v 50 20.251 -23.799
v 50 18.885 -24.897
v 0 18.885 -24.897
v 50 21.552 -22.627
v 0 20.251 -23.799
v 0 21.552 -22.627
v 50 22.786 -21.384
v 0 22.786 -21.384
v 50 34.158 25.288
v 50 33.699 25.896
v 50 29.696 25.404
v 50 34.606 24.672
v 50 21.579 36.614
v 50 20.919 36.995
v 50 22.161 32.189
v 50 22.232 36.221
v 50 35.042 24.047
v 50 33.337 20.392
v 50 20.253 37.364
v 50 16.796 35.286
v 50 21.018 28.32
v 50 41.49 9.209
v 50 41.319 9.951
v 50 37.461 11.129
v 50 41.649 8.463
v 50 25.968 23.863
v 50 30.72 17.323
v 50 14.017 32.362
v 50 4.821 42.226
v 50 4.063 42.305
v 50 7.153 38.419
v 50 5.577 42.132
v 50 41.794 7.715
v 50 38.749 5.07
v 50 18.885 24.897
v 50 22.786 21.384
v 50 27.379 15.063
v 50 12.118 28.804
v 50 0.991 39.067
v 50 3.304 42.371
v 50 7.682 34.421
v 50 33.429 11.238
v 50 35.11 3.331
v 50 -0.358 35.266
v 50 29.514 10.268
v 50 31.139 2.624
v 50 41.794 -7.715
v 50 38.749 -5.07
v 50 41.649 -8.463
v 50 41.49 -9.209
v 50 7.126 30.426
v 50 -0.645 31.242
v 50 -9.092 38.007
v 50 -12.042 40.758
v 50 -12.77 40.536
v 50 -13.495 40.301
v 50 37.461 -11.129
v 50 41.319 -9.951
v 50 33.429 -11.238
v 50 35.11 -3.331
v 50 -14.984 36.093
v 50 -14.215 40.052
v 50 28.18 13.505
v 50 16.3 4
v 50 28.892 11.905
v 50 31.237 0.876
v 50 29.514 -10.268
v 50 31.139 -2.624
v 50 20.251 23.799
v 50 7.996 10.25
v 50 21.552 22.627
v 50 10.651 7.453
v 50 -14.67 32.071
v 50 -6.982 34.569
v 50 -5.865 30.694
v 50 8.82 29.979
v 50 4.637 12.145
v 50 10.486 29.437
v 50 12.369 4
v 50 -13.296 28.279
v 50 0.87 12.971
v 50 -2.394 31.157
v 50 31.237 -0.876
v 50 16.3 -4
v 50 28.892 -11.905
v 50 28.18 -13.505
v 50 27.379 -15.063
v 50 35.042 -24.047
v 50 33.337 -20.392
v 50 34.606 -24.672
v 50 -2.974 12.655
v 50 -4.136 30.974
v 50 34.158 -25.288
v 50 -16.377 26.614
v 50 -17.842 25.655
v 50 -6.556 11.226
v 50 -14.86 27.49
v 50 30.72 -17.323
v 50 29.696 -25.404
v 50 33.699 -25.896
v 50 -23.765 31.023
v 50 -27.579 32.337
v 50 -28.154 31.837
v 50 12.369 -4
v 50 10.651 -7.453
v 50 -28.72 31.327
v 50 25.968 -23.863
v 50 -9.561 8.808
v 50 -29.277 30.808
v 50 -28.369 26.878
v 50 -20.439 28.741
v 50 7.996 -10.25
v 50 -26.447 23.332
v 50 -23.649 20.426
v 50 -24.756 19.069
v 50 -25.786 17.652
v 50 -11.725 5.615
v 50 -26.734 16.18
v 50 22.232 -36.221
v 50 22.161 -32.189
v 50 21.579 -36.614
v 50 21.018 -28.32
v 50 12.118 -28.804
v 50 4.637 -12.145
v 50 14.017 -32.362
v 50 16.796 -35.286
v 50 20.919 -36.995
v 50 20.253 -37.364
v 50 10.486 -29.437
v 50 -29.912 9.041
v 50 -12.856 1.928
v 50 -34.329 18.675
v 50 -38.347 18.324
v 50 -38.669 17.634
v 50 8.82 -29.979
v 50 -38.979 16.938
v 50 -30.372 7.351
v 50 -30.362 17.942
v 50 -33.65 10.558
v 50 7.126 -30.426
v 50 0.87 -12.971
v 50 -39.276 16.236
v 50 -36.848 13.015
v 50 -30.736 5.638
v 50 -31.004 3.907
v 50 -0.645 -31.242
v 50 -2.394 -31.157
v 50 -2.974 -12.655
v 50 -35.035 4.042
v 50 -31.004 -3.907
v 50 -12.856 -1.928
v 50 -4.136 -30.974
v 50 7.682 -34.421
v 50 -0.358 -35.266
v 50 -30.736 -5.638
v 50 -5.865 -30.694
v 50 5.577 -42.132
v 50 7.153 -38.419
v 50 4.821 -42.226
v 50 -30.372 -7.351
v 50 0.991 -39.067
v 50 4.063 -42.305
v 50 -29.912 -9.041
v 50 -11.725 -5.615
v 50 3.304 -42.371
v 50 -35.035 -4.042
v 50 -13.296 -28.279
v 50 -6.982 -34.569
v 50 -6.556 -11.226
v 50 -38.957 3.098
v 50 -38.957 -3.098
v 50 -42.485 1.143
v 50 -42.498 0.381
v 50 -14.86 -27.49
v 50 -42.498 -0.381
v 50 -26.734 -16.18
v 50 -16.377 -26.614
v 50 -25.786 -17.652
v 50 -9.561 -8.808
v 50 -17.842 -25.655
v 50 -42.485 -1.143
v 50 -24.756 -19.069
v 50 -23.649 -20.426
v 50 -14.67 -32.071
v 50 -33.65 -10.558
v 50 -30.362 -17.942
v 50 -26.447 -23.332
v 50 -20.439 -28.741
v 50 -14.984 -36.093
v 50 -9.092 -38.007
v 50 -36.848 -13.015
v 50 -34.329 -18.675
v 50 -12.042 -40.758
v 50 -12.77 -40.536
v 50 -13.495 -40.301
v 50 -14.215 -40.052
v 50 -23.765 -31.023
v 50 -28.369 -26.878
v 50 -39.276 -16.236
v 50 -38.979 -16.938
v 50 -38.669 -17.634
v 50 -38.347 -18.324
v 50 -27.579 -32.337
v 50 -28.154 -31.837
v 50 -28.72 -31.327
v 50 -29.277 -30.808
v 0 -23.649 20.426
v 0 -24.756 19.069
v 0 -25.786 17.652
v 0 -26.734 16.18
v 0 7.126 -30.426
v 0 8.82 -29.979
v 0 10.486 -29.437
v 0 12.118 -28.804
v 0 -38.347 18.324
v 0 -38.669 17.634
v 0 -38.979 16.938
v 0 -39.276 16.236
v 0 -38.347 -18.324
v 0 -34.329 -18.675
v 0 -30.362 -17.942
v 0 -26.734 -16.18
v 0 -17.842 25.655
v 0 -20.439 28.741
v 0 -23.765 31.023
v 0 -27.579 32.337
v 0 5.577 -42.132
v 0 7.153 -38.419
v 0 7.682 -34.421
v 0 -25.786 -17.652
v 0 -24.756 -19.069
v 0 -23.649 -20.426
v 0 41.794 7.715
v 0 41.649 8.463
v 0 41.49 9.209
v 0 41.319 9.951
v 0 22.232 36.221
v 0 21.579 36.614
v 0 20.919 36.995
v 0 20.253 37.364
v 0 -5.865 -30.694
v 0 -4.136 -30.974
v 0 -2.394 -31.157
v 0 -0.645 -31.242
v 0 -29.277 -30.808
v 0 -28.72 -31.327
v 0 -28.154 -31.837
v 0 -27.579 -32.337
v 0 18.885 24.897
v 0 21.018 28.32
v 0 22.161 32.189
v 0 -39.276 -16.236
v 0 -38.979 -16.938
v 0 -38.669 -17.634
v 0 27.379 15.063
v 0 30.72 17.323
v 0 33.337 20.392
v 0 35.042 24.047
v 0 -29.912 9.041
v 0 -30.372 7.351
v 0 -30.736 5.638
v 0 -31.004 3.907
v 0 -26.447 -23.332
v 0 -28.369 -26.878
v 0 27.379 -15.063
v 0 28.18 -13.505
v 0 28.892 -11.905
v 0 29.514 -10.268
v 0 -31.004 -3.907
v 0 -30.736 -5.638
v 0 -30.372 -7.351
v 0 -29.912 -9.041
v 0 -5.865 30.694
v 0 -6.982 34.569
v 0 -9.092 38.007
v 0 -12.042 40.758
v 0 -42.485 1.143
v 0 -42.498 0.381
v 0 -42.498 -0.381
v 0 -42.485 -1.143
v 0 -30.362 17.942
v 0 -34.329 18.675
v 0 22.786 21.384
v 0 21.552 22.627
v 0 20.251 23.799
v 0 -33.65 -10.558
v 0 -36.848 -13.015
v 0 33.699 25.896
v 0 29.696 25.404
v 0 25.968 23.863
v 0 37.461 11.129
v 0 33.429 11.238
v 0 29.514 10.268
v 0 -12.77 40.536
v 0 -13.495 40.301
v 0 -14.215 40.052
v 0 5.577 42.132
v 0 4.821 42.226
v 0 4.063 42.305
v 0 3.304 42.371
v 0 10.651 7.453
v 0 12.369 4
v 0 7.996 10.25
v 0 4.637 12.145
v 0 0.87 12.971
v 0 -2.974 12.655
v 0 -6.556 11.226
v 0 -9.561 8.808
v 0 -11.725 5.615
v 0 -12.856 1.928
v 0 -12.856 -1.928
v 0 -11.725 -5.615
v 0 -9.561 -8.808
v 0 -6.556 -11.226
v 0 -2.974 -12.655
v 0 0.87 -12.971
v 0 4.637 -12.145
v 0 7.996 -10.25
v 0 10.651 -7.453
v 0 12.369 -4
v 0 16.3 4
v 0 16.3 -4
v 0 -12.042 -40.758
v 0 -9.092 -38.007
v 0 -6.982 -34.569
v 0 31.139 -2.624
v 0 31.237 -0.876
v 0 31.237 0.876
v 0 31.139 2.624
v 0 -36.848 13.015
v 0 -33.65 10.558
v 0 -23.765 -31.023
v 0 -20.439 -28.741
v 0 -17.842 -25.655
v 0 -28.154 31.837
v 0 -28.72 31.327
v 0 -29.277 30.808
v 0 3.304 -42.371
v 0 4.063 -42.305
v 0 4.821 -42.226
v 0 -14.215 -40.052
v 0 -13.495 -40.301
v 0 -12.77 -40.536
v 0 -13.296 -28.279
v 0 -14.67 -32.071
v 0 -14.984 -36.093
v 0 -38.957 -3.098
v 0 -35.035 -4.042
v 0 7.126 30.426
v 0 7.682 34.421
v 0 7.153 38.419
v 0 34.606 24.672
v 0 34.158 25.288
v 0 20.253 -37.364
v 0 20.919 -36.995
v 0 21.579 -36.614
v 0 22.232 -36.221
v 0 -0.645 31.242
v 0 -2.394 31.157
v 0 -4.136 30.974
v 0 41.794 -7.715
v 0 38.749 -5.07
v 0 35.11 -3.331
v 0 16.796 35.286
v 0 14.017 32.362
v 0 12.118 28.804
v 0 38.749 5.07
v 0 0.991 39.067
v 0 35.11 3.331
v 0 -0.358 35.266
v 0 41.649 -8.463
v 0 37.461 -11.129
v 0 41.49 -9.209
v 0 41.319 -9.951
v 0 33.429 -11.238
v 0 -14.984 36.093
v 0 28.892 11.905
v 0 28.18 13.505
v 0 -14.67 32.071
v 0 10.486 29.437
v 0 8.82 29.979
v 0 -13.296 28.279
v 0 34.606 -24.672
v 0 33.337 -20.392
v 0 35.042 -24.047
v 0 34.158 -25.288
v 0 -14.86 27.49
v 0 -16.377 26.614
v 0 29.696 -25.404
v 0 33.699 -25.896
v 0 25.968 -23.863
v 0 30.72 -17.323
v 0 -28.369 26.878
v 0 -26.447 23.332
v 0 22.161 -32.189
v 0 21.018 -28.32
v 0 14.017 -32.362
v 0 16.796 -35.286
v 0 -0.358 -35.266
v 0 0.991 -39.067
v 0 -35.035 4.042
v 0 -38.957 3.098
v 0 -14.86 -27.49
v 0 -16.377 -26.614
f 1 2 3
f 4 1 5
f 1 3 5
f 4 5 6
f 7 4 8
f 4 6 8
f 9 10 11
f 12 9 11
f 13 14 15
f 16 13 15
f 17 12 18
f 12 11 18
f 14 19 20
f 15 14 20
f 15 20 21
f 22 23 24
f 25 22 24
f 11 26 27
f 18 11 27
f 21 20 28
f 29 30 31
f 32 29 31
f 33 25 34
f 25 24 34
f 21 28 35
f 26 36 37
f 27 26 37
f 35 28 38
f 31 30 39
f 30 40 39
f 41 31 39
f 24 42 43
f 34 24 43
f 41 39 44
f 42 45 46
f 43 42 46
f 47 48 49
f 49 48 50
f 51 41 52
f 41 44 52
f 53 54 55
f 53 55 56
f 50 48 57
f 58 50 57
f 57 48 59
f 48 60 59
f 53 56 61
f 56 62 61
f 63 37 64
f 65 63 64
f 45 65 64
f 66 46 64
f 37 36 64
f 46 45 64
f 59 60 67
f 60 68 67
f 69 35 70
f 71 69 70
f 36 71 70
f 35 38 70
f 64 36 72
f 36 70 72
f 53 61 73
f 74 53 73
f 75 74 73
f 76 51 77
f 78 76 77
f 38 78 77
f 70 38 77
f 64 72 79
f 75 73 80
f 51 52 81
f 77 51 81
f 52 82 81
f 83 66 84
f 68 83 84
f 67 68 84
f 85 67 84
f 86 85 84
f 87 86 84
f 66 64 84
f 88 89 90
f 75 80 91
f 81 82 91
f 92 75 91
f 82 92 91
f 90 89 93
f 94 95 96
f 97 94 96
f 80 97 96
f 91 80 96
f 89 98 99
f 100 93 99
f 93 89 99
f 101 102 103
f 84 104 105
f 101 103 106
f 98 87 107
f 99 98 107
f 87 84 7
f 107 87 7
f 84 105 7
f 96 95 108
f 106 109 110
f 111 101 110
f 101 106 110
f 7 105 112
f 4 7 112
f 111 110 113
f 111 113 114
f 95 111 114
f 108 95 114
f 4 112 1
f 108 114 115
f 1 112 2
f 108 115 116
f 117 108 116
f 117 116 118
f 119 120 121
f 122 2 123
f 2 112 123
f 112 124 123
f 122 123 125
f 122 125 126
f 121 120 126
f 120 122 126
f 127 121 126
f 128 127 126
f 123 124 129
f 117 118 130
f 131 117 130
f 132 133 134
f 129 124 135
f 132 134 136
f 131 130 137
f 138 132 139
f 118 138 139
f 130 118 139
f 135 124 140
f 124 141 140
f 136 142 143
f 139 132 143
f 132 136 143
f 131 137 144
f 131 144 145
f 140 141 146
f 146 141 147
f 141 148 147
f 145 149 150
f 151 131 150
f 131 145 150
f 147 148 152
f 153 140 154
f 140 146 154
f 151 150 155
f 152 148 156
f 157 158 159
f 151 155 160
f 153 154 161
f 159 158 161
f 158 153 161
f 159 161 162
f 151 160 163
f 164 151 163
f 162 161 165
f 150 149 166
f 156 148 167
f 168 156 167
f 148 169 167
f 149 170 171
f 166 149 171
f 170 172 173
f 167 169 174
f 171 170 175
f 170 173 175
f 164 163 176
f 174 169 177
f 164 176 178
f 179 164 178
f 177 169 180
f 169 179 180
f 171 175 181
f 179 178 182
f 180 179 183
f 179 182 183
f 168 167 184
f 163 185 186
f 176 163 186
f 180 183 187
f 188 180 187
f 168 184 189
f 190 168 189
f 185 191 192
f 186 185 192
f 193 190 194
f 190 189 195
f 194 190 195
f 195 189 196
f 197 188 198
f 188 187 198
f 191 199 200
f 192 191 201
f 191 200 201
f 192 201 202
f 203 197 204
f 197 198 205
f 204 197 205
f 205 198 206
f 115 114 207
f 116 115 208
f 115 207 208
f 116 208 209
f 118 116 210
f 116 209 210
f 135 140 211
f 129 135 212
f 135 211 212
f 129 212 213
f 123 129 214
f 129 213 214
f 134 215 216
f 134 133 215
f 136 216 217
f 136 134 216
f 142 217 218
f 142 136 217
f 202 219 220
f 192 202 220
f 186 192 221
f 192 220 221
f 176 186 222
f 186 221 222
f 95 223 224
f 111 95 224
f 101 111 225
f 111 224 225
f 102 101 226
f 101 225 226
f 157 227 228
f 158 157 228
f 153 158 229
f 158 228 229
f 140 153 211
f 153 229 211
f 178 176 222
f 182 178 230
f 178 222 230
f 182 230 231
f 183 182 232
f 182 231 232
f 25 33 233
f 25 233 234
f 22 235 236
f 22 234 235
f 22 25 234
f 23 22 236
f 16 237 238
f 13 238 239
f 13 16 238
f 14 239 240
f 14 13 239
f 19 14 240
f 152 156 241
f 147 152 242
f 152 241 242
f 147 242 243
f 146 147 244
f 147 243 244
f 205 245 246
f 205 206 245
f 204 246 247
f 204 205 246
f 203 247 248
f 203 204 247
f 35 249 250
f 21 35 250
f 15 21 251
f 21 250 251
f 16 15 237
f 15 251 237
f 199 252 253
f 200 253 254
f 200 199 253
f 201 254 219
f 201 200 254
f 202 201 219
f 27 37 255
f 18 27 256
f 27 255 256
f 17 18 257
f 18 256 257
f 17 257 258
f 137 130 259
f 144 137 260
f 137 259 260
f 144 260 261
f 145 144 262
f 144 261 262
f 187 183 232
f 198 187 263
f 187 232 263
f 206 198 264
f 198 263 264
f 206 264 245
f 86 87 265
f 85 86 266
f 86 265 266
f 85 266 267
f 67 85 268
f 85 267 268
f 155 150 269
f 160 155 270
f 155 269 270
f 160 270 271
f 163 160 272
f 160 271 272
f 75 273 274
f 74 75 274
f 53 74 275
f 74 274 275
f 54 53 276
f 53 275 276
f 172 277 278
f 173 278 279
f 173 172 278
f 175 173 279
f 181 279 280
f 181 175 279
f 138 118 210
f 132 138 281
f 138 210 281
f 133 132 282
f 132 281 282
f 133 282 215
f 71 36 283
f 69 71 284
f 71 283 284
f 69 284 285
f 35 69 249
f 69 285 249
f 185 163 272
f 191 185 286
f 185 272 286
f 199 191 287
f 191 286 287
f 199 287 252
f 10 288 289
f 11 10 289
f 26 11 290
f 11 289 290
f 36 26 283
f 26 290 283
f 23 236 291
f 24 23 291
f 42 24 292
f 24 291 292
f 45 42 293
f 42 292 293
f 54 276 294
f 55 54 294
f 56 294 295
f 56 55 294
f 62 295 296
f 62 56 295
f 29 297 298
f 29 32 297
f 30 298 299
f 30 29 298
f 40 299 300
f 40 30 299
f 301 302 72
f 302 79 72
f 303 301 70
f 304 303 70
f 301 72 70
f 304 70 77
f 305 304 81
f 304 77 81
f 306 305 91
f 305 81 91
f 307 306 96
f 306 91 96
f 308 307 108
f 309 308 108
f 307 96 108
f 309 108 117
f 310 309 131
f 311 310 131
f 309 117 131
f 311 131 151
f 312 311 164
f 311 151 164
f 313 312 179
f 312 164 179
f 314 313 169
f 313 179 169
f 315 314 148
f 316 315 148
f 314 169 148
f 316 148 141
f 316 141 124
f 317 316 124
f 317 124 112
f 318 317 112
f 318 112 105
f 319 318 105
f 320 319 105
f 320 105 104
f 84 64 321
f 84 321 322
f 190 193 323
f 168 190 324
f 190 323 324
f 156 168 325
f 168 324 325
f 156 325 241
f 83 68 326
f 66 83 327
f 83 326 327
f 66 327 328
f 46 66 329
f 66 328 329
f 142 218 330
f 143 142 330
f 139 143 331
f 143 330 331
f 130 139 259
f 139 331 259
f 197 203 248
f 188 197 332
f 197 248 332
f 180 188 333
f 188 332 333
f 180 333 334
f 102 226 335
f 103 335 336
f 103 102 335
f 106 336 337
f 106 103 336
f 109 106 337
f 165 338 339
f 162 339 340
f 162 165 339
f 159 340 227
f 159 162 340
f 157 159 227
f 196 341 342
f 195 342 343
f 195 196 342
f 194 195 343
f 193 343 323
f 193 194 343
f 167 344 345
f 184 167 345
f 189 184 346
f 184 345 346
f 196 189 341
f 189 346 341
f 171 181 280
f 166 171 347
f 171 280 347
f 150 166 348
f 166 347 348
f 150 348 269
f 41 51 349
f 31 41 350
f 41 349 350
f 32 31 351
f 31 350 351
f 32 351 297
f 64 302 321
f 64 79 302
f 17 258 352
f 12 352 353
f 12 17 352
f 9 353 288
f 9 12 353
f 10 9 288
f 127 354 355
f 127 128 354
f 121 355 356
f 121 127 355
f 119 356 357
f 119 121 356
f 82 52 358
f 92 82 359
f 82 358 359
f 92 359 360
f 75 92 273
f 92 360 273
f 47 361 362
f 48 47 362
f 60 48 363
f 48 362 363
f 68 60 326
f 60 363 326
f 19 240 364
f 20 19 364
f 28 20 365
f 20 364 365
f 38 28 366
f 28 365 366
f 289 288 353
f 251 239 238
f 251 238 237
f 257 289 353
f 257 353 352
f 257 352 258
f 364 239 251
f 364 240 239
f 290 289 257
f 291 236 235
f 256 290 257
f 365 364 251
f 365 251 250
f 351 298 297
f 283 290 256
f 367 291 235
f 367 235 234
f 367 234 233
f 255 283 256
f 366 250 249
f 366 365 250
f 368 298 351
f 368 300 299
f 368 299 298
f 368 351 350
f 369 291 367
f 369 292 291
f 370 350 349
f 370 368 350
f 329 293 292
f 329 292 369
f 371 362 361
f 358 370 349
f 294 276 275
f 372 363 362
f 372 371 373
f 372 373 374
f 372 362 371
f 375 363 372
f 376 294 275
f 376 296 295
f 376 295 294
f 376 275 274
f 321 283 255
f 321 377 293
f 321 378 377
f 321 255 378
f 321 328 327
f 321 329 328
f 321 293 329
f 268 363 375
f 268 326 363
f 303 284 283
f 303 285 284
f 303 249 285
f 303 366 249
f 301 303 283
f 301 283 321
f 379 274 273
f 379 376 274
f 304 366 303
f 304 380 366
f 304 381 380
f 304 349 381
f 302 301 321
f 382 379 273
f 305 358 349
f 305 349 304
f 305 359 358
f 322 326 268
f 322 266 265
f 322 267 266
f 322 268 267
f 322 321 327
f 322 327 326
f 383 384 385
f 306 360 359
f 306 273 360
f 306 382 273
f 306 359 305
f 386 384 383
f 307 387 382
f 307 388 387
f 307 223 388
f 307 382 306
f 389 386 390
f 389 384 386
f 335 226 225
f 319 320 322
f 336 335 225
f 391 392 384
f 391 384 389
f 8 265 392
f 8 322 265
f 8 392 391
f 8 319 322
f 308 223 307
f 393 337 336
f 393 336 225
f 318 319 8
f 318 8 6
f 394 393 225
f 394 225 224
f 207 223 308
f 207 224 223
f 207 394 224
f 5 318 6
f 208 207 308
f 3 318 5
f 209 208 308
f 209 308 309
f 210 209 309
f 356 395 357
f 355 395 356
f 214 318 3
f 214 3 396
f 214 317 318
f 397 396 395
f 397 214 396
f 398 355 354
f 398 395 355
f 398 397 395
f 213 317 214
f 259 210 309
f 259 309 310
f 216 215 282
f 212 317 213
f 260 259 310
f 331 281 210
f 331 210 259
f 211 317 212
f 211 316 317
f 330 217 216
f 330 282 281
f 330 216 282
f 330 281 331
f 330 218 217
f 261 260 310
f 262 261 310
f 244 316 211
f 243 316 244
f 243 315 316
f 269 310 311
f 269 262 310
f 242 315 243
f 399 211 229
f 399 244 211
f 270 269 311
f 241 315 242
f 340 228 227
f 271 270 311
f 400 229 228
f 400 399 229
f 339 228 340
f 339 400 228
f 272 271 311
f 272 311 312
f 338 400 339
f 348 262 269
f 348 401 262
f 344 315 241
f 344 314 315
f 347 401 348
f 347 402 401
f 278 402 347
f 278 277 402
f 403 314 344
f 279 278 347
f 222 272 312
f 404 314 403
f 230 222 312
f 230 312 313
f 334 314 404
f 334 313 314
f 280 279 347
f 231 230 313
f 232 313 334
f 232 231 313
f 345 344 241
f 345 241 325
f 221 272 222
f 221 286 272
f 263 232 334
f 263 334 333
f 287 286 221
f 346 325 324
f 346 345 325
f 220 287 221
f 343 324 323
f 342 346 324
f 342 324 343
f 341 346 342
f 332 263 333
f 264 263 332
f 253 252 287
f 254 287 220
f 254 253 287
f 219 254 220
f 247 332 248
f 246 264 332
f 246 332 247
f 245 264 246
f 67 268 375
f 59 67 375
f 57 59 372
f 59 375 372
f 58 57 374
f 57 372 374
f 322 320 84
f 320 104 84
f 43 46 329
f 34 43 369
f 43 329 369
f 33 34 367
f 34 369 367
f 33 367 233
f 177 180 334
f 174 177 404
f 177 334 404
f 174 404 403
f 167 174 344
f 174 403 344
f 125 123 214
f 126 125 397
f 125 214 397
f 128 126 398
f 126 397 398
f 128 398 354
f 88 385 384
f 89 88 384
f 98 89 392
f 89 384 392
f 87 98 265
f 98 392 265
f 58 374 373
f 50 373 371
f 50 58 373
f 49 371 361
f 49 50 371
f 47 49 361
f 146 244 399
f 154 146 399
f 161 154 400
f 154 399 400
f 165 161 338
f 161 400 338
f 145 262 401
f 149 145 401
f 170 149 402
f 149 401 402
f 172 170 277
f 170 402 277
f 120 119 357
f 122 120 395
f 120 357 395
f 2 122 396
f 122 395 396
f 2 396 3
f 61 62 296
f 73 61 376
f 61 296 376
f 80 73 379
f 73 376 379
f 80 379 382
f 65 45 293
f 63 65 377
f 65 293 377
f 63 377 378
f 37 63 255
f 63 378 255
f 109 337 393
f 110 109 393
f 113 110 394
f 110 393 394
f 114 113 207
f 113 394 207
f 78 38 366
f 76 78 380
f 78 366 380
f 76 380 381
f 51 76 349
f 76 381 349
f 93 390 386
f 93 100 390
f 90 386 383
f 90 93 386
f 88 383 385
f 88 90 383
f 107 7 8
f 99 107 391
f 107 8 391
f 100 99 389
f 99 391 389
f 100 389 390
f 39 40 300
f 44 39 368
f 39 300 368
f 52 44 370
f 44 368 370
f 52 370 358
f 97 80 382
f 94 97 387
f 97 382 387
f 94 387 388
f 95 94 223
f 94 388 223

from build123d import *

# Parameters (mm, degrees)
BASPROSKE_W     = 50
BASPROSKE_H     = 42.5
TOOTHCUT_DEPTH  = 79.182478856
TEETHCUTS_COUNT = 15
TEETHCUTS_ANGLE = 336
BORSKE_R        = 13
BORE_DEPTH      = 50.0000508
KEYSKE_W        = 8
KEYSKE_H        = 16.3
KEYWAY_DEPTH    = 50.0000508


with BuildPart() as part:
    # BasProSke → Base-Revolve (revolve)
    with BuildSketch(Plane(origin=(0, 0, 0), x_dir=(1, 0, 0), z_dir=(0, 1, 0)), mode=Mode.PRIVATE) as base_revolve_sk:
        with Locations((25, 21.25)):
            Rectangle(BASPROSKE_W, BASPROSKE_H)
    revolve(base_revolve_sk.sketch.rotate(Axis((-10, 0, 0), (1, 0, 0)), 180), axis=Axis((-10, 0, 0), (1, 0, 0)))

    # TooCutSke → ToothCut (cut, through all)
    with BuildSketch(Plane(origin=(0, 0, 0), x_dir=(0, 0, -1), z_dir=(1, 0, 0))):
        with BuildLine():
            ThreePointArc((2.624472836, 31.138595719), (0, 31.249), (-2.624472836, 31.138595719))
            ThreePointArc((-2.624472836, 31.138595719), (-4.084227986, 37.002862003), (-7.739685892, 41.815151649))
            ThreePointArc((-7.739685892, 41.815151649), (0, 42.5254), (7.739685892, 41.815151649))
            ThreePointArc((7.739685892, 41.815151649), (4.084227986, 37.002862003), (2.624472836, 31.138595719))
        make_face()
    toothcut = extrude(amount=TOOTHCUT_DEPTH, mode=Mode.SUBTRACT)

    # TeethCuts: ToothCut ×15 about axis
    teethcuts_axis = Axis((-10, 0, 0), (1, 0, 0))
    for i in range(1, TEETHCUTS_COUNT):
        add(toothcut.rotate(teethcuts_axis, i * TEETHCUTS_ANGLE / (TEETHCUTS_COUNT - 1)), mode=Mode.SUBTRACT)

    # BorSke → Bore (cut, symmetric)
    with BuildSketch(Plane(origin=(0, 0, 0), x_dir=(0, 0, -1), z_dir=(1, 0, 0))):
        with Locations(Location((0, 0, 0), (0, 0, 180))):
            Circle(BORSKE_R)
    extrude(amount=BORE_DEPTH, both=True, mode=Mode.SUBTRACT)

    # KeySke → Keyway (cut, symmetric)
    with BuildSketch(Plane(origin=(0, 0, 0), x_dir=(0, 0, -1), z_dir=(1, 0, 0))):
        with Locations((0, 8.15)):
            Rectangle(KEYSKE_W, KEYSKE_H)
    extrude(amount=KEYWAY_DEPTH, both=True, mode=Mode.SUBTRACT)


solid = part.part
